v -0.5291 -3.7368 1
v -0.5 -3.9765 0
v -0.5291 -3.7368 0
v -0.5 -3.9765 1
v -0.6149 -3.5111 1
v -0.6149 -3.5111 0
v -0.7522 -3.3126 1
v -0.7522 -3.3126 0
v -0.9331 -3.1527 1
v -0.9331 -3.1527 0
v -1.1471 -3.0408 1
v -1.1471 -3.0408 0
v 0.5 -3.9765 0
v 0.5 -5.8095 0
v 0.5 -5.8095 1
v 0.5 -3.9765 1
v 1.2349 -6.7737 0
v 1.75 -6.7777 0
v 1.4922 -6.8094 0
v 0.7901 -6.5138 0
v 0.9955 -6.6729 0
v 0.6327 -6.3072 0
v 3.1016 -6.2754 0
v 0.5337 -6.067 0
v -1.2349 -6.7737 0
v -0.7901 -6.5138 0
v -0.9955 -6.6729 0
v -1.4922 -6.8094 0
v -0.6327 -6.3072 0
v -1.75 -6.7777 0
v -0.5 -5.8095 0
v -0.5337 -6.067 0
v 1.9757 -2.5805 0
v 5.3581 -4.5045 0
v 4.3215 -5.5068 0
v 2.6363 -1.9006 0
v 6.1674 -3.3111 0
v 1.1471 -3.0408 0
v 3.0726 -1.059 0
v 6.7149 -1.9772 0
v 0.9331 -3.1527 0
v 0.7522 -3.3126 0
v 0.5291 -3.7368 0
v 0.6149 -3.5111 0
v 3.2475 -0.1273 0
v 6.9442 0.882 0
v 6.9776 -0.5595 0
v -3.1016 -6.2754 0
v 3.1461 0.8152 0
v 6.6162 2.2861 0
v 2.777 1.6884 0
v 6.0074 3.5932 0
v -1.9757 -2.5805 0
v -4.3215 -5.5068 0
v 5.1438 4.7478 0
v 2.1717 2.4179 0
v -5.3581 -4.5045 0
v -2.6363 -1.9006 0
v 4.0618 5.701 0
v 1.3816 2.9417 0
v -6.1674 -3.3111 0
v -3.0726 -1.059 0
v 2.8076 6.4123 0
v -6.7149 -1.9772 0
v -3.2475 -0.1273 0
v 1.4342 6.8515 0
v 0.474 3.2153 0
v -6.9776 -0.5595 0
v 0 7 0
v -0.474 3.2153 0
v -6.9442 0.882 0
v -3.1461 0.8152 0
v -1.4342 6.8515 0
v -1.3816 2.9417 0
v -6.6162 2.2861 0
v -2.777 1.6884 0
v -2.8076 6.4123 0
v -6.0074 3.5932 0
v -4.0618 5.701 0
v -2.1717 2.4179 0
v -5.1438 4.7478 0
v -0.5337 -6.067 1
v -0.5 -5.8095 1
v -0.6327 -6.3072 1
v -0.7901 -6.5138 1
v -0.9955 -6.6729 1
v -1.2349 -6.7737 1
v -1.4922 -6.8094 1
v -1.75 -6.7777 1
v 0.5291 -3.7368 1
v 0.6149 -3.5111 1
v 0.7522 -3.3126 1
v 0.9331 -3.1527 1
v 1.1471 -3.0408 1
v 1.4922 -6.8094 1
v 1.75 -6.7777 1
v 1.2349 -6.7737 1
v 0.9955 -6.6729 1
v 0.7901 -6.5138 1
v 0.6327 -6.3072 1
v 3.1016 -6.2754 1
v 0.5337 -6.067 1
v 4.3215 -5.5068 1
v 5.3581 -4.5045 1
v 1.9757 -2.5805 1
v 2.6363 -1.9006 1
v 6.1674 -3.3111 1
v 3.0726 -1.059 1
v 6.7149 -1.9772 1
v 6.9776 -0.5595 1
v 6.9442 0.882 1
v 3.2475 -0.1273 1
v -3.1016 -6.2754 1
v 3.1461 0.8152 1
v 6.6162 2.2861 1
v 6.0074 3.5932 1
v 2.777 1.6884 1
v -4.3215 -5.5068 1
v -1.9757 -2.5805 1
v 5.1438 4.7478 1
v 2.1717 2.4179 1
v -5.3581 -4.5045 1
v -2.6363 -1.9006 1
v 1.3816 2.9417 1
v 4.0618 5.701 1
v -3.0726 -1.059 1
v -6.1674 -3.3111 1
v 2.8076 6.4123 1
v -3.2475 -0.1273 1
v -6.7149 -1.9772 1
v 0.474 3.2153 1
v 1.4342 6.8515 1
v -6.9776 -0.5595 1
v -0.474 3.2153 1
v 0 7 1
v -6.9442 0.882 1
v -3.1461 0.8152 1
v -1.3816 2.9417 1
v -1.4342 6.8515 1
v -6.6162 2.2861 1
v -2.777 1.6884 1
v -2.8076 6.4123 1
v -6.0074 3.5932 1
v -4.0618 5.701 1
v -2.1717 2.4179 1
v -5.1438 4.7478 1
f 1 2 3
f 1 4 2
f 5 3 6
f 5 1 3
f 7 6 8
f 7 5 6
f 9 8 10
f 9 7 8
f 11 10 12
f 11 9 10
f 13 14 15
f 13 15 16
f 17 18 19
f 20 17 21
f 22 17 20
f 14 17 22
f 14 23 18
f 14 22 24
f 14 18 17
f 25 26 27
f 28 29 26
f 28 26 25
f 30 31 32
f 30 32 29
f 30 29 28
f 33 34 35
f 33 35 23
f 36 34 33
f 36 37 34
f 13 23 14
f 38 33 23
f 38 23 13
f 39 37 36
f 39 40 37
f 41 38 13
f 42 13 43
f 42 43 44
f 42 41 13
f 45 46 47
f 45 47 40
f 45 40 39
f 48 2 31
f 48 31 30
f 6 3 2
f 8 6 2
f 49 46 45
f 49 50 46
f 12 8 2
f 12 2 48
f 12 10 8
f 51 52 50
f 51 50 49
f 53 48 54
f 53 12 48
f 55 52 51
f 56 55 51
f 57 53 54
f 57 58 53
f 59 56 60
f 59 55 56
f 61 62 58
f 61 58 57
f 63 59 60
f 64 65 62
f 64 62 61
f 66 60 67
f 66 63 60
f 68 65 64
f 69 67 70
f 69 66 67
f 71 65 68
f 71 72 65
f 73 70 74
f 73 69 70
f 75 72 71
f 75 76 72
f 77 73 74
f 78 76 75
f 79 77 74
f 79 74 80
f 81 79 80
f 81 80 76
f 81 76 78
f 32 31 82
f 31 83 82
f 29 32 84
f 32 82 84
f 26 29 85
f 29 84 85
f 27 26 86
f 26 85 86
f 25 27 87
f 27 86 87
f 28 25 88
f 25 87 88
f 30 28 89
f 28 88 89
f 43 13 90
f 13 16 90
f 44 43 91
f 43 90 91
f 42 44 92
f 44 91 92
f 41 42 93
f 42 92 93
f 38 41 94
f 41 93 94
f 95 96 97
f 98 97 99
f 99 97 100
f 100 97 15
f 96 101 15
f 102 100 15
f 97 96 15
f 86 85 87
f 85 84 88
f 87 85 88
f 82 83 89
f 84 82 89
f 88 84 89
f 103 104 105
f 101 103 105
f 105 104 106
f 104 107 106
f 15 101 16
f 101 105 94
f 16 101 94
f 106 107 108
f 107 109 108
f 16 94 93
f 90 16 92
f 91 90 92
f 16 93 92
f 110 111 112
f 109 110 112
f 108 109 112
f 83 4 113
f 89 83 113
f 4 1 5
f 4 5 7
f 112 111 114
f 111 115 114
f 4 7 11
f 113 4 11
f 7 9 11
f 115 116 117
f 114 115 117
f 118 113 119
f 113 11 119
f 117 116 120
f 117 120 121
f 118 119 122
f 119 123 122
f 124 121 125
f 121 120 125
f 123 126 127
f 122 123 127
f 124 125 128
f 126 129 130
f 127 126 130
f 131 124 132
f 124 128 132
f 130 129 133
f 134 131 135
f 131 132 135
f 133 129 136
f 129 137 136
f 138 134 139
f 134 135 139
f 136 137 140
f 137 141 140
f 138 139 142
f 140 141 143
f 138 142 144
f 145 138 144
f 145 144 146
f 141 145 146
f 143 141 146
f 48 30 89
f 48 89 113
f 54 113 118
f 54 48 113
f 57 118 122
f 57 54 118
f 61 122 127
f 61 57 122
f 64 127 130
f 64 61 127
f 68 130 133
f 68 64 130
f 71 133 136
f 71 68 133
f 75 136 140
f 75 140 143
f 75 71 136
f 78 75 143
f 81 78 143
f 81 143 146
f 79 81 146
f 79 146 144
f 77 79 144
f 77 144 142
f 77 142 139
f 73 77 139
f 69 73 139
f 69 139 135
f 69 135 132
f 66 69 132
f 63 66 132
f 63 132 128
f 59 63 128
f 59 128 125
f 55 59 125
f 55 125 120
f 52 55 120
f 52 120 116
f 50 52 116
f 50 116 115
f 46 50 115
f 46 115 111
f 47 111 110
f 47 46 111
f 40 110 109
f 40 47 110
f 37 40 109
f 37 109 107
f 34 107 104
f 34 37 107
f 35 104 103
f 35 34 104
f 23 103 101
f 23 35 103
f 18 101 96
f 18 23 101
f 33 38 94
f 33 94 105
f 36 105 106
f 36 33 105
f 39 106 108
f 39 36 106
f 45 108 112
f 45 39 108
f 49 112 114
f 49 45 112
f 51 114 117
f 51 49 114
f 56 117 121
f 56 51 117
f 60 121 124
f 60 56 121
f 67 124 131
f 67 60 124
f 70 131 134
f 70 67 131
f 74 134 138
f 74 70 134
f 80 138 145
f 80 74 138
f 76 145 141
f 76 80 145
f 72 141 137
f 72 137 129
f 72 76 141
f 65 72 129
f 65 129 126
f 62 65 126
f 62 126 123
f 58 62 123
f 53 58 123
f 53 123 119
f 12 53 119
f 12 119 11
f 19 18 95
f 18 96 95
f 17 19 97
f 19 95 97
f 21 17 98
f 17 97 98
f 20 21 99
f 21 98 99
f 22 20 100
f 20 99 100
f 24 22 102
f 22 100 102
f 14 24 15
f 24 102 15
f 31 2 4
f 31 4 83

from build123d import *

# Parameters (mm, degrees)
P_IDAT_VYSUNUT_M1_DEPTH = 1
ZAOBLIT1_R              = 1


with BuildPart() as part:
    # Skica1 → Přidat vysunutím1 (new body)
    with BuildSketch(Plane.XY):
        with BuildLine():
            Line((-0.5, -3.211308145), (-0.5, -6.982120022))
            ThreePointArc((-0.5, -6.982120022), (0, 7), (0.5, -6.982120022))
            Line((0.5, -6.982120022), (0.5, -3.211308145))
            ThreePointArc((0.5, -3.211308145), (0, 3.25), (-0.5, -3.211308145))
        make_face()
    extrude(amount=P_IDAT_VYSUNUT_M1_DEPTH)

    # Zaoblit1
    zaoblit1_edges = [part.edges().sort_by_distance(p)[0] for p in [
        (-0.5, -3.211308145, 0.5),
        (-0.5, -6.982120022, 0.5),
        (0.5, -6.982120022, 0.5),
        (0.5, -3.211308145, 0.5),
    ]]
    fillet(zaoblit1_edges, radius=ZAOBLIT1_R)


solid = part.part
